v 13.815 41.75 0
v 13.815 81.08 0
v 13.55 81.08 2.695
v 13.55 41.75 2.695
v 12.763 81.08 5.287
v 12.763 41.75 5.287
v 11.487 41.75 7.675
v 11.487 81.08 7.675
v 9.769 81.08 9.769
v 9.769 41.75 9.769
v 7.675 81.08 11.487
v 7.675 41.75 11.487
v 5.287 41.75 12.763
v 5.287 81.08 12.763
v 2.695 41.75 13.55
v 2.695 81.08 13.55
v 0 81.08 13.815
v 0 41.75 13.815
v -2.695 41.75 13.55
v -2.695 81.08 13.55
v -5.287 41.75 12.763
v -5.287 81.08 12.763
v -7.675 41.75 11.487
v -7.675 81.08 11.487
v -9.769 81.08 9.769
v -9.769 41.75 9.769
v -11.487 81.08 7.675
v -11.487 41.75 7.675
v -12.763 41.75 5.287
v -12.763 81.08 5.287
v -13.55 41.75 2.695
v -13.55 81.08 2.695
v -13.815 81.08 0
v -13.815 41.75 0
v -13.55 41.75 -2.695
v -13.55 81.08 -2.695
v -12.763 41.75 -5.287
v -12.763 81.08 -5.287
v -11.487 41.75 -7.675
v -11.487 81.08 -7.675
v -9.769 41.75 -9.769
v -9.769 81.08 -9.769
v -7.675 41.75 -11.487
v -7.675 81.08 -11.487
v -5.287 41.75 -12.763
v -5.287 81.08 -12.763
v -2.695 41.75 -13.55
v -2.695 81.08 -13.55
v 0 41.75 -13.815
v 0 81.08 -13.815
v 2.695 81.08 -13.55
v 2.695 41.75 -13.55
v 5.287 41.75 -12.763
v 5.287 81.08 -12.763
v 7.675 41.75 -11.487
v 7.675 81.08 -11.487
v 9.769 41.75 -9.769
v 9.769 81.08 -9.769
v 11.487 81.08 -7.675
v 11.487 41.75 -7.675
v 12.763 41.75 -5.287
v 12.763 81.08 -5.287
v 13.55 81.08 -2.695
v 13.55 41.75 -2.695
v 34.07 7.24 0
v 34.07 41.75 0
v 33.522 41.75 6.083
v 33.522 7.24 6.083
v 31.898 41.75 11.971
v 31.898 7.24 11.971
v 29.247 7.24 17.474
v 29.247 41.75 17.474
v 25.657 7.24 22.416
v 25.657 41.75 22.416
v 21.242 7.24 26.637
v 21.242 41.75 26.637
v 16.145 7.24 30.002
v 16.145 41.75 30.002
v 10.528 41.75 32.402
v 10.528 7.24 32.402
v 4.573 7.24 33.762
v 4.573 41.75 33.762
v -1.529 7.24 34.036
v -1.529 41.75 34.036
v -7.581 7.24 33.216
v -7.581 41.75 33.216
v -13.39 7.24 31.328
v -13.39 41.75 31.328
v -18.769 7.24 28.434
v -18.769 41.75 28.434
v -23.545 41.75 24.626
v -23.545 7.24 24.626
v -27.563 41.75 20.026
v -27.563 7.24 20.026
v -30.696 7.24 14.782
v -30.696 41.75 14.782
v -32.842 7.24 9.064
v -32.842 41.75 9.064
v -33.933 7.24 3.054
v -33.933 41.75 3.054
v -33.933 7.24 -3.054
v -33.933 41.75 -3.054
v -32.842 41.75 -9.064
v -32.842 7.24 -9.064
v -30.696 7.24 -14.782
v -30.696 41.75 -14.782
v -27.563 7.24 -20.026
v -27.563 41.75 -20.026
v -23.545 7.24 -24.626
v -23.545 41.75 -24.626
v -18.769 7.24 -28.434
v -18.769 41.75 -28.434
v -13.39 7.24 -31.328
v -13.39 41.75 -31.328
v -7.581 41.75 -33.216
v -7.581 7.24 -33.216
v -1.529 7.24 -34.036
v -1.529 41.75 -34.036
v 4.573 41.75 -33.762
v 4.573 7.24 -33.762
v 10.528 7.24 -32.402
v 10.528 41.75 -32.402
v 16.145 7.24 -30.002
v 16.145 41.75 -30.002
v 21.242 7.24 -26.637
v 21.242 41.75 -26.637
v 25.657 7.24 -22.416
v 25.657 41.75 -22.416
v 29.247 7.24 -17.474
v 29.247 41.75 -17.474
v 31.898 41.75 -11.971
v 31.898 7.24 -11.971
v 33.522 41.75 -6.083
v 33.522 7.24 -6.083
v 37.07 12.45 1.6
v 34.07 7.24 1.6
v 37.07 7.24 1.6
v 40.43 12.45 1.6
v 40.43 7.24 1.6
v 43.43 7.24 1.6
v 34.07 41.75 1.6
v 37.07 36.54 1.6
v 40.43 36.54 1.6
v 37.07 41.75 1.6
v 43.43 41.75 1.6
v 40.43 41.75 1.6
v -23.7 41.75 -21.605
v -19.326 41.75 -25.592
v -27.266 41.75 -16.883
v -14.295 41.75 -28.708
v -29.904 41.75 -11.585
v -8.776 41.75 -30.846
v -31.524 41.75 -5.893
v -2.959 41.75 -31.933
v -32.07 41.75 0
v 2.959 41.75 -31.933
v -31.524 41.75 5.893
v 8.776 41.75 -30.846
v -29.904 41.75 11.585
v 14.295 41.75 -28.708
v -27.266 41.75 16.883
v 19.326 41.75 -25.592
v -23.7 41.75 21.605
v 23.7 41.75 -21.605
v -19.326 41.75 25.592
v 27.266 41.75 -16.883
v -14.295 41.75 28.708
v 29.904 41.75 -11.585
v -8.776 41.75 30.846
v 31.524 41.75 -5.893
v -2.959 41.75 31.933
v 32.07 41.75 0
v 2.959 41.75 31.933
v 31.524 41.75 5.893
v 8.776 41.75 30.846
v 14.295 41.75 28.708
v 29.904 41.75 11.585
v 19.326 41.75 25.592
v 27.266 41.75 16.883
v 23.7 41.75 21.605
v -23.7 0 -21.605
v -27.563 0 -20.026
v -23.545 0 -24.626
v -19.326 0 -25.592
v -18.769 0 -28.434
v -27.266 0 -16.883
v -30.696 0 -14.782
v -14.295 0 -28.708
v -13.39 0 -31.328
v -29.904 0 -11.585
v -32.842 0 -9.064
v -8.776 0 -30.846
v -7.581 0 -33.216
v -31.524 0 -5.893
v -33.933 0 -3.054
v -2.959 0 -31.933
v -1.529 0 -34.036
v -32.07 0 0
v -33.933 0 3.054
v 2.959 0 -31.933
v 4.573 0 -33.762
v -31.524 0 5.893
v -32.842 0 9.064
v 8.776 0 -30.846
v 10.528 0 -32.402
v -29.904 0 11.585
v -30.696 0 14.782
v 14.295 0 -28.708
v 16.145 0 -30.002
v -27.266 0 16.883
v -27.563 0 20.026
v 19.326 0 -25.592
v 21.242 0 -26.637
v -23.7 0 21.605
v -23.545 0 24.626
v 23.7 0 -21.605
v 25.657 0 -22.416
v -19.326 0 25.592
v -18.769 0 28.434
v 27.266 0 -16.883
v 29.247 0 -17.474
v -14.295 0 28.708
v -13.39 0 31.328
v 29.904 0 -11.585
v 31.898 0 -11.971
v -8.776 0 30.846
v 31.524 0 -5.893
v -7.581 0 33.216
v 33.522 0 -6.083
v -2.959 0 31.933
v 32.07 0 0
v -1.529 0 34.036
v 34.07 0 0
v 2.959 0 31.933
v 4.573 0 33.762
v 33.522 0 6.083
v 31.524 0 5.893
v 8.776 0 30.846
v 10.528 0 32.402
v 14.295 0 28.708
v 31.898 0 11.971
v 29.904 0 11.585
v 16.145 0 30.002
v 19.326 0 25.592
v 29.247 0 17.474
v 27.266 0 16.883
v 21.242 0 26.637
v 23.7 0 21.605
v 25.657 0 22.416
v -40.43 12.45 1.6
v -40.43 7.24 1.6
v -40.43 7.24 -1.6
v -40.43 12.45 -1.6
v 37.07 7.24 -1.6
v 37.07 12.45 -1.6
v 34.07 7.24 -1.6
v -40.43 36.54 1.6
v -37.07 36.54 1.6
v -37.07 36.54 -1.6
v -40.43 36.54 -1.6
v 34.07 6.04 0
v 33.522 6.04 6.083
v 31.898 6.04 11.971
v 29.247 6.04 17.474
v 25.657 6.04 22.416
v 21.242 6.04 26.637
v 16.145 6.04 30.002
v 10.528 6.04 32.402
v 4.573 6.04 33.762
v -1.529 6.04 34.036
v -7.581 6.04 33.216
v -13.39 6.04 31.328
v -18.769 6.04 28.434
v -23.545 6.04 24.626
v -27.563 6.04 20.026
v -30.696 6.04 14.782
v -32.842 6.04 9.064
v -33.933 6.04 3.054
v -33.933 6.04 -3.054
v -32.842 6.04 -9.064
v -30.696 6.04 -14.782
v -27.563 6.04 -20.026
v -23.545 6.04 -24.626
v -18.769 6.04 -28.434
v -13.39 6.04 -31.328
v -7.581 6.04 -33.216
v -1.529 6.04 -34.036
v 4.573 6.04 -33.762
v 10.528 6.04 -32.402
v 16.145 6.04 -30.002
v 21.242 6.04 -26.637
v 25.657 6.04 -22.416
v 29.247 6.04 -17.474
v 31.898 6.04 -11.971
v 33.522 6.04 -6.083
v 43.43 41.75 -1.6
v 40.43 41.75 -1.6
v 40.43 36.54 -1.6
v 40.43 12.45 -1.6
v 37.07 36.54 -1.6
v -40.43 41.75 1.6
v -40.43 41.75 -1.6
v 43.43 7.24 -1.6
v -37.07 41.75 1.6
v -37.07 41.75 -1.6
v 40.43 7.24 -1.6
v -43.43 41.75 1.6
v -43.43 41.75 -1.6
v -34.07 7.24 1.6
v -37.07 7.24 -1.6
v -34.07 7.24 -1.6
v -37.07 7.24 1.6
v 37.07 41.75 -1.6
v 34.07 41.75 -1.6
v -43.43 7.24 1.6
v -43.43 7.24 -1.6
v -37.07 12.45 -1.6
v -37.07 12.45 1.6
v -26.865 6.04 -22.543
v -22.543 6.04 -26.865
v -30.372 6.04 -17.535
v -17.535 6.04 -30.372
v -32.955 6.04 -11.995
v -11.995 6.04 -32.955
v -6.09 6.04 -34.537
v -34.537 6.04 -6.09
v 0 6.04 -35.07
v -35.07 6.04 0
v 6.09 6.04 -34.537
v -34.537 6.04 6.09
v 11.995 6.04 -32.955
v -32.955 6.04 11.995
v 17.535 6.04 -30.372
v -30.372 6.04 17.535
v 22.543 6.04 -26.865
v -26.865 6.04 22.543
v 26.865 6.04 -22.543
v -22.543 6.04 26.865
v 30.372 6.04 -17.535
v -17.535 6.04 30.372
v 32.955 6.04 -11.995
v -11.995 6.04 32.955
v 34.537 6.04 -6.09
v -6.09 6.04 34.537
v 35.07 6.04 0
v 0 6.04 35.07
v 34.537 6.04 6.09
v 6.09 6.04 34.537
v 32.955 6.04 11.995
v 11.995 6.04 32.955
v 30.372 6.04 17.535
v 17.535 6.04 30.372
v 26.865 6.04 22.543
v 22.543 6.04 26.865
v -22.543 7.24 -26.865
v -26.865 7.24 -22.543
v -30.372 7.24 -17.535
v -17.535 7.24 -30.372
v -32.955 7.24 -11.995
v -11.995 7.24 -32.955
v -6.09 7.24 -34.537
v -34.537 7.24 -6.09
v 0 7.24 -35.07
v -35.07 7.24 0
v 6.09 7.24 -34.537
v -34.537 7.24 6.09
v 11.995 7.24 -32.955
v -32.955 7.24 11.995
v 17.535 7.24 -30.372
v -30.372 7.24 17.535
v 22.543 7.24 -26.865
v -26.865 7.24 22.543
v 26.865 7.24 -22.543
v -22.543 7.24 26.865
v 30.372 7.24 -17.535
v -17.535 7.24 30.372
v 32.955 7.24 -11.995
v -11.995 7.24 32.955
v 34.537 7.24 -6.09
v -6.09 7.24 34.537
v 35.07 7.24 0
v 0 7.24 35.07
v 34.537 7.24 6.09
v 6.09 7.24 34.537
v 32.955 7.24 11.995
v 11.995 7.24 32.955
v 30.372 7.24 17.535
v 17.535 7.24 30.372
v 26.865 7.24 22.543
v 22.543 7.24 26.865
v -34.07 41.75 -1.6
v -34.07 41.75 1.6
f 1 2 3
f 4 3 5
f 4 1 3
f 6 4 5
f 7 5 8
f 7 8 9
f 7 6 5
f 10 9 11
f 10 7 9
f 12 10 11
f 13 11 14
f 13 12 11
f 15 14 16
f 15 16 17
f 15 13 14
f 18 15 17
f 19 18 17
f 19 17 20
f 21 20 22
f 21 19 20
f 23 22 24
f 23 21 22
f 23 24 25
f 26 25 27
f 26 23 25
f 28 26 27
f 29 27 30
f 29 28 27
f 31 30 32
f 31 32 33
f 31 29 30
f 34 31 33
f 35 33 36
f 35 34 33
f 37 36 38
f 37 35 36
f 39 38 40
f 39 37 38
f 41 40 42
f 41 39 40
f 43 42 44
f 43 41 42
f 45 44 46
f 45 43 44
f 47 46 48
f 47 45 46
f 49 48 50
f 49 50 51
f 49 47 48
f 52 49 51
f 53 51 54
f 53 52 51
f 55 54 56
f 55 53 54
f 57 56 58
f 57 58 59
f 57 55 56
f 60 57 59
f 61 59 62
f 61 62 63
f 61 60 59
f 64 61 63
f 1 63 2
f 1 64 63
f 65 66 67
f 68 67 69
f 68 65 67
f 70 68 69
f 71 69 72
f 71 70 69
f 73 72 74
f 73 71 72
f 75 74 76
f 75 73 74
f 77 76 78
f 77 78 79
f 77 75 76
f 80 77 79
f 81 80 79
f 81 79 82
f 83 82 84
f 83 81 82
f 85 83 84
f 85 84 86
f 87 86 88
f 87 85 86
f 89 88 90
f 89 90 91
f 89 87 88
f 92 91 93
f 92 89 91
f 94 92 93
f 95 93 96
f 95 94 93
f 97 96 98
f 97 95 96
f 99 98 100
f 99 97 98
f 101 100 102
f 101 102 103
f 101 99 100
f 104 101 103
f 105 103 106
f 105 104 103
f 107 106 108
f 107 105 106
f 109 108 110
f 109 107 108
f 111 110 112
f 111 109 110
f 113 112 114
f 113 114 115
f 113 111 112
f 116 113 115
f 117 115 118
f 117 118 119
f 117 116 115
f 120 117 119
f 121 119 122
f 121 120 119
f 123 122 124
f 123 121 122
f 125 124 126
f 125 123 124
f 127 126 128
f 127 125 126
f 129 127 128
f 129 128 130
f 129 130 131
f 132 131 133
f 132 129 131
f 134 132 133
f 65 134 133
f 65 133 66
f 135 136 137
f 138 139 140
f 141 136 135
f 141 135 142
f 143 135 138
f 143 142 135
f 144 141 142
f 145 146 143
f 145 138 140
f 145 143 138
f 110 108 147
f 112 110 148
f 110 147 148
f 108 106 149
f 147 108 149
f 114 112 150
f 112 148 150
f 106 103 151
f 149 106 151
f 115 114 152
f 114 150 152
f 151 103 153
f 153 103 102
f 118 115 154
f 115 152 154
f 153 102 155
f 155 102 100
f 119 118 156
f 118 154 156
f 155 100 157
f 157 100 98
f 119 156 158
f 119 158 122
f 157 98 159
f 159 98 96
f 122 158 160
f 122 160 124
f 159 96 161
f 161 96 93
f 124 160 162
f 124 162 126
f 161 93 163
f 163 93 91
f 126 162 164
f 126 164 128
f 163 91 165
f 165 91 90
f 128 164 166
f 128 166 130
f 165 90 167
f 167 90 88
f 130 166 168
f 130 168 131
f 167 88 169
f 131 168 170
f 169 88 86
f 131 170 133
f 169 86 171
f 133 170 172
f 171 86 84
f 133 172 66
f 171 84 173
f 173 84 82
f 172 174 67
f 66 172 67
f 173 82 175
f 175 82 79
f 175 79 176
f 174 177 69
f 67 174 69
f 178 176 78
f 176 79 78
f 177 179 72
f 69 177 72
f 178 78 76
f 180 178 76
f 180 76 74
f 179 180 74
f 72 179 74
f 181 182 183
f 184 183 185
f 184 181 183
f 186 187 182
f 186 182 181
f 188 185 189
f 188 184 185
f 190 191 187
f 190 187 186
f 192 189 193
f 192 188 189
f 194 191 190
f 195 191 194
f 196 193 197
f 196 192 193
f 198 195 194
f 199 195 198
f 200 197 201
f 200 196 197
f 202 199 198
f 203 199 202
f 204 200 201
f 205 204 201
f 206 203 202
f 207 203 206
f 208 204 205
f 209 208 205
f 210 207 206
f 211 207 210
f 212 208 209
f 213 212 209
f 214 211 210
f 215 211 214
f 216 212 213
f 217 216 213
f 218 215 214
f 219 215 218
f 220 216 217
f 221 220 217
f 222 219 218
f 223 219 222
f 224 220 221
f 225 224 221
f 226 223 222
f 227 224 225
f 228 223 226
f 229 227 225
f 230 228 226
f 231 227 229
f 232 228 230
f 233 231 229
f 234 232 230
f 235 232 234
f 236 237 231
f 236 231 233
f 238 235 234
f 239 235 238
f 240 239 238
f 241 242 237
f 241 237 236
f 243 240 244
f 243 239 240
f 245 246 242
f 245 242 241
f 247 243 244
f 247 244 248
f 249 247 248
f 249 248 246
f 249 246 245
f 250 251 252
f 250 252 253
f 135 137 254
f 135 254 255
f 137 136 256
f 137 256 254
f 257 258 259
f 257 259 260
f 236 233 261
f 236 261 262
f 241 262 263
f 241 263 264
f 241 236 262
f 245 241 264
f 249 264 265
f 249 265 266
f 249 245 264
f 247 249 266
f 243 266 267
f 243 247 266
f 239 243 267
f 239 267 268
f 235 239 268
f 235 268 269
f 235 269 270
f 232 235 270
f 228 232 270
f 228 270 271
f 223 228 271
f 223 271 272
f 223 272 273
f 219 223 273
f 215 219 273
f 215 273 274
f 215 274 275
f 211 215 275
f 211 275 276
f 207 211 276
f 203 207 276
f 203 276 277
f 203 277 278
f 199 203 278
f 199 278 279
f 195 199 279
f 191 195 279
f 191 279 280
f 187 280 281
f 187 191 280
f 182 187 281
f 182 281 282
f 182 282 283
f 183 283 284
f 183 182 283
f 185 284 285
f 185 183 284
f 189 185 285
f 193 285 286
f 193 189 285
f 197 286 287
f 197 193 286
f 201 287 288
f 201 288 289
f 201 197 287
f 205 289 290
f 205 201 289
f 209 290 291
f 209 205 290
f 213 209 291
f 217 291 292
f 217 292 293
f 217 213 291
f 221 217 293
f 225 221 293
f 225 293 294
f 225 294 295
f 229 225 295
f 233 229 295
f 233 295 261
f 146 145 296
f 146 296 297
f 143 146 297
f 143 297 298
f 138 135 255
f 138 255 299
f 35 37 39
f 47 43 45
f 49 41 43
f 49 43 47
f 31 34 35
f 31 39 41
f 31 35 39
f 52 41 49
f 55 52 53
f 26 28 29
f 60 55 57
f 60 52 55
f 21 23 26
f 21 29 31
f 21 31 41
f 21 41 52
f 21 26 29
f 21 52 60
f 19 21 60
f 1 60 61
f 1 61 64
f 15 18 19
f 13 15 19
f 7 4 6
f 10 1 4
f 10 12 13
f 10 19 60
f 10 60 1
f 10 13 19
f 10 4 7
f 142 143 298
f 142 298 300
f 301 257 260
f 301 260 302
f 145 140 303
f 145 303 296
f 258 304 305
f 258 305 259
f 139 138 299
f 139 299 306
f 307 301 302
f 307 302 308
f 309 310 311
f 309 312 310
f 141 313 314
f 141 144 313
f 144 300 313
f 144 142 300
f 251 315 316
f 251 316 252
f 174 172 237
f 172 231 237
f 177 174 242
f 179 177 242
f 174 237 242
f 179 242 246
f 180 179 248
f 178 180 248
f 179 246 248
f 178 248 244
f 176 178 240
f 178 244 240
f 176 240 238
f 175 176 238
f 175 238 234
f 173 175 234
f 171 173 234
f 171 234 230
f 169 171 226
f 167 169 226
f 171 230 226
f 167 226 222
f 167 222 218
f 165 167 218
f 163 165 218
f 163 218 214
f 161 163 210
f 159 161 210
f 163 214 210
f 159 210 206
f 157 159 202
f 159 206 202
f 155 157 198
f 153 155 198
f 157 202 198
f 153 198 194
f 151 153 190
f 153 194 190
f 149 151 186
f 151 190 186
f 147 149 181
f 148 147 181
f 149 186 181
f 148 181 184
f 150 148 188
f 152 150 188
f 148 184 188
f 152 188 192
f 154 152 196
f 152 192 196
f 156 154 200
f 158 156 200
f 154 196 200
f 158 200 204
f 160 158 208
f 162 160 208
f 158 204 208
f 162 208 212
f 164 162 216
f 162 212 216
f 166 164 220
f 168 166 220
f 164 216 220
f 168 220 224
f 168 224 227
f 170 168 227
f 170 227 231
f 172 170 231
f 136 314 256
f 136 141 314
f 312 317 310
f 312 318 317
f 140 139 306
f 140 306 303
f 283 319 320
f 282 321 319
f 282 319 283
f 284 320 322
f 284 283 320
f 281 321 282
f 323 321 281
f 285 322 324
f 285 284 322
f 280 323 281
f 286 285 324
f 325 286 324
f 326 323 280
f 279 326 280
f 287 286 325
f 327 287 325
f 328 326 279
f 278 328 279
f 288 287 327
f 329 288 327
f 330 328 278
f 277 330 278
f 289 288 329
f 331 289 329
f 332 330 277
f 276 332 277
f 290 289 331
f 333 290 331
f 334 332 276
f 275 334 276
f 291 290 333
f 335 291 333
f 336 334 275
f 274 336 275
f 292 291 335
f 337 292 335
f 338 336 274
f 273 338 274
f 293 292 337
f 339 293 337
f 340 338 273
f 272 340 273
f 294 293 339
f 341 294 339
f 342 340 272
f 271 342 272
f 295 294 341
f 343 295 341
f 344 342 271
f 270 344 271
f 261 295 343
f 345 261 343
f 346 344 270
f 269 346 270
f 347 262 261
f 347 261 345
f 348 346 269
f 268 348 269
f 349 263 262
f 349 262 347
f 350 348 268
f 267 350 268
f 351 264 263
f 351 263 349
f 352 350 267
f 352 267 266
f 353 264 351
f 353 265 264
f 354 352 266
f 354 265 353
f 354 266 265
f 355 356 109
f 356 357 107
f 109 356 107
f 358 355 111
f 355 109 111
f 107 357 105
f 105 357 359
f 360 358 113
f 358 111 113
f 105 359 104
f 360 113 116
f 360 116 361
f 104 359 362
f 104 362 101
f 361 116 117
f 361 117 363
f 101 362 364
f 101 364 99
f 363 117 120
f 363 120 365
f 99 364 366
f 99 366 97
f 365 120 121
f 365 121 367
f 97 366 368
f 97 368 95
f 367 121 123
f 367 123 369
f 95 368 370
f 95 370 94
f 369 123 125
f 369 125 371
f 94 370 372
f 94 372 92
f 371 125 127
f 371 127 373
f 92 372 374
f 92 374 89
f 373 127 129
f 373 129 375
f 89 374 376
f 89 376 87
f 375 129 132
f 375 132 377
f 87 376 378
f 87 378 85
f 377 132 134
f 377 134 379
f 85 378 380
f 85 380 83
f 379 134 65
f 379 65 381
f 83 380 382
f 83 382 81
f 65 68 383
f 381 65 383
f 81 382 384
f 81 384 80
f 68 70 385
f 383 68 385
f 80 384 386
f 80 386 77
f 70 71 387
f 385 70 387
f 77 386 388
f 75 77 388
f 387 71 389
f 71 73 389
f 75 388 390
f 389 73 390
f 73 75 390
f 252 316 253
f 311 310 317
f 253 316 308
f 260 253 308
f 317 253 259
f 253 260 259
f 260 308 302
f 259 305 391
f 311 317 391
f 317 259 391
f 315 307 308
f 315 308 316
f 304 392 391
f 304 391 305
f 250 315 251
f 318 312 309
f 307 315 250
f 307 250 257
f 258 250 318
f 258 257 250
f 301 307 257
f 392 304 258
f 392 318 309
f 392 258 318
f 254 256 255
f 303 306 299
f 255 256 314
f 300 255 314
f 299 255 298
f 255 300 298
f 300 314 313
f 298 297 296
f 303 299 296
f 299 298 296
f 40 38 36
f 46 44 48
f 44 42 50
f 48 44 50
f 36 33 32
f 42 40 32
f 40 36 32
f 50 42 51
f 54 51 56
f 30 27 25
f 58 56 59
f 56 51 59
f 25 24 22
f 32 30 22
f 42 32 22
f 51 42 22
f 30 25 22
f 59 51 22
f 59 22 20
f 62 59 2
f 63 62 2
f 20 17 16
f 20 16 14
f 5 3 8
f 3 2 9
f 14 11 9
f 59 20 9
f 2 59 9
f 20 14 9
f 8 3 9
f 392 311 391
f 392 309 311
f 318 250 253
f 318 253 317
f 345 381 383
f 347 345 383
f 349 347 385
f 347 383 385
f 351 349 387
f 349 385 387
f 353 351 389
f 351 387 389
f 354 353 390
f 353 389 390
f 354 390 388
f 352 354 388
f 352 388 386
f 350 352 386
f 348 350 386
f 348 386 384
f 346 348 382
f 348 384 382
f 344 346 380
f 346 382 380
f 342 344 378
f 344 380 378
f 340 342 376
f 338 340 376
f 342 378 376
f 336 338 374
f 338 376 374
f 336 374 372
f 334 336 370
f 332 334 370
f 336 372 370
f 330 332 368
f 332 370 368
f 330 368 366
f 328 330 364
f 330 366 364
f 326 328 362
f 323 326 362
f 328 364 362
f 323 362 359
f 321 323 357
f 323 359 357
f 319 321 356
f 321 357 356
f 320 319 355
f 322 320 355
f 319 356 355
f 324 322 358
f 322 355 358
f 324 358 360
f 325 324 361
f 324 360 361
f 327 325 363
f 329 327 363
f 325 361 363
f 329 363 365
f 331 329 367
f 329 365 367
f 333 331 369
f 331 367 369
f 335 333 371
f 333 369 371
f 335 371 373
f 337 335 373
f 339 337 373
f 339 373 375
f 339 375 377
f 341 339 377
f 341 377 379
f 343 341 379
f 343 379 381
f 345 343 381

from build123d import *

# Parameters (mm, degrees)
F0_R      = 34.07
F0_R_2    = 32.07
F3_DEPTH  = 7.24
F2_R      = 35.07
F2_R_2    = 32.07
F4_DEPTH  = 1.2
F6_R      = 34.07
F6_R_2    = 32.07
F7_DEPTH  = 34.51
F9_R      = 13.815
F10_DEPTH = 39.33
F12_DEPTH = 1.6


with BuildPart() as f3:
    # F0 (on Front) → F3 (new body, through all)
    with BuildSketch(Plane.XZ):
        Circle(F0_R)
        Circle(F0_R_2, mode=Mode.SUBTRACT)
    extrude(amount=-F3_DEPTH)

    # F2 (on offset) → F4 (join)
    with BuildSketch(Plane.XZ.offset(-7.24)):
        Circle(F2_R)
        Circle(F2_R_2, mode=Mode.SUBTRACT)
    extrude(amount=F4_DEPTH)

    # F6 (on offset) → F7 (join)
    with BuildSketch(Plane.XZ.offset(-7.24)):
        Circle(F6_R)
        Circle(F6_R_2, mode=Mode.SUBTRACT)
    extrude(amount=-F7_DEPTH)


with BuildPart() as f10:
    # F9 (on offset) → F10 (new body)
    with BuildSketch(Plane.XZ.offset(-41.75)):
        Circle(F9_R)
    extrude(amount=-F10_DEPTH)


with BuildPart() as f12:
    # F11 (on Top) → F12 (new body, symmetric)
    with BuildSketch(Plane.XY):
        Polygon((-34.07, 7.24), (-34.07, 41.75), (-37.07, 41.75), (-37.07, 36.54), (-40.43, 36.54), (-40.43, 41.75), (-43.43, 41.75), (-43.43, 7.24), (-40.43, 7.24), (-40.43, 12.45), (-37.07, 12.45), (-37.07, 7.24), align=None)
    extrude(amount=F12_DEPTH, both=True)


with BuildPart() as f12b:
    # F11 (on Top) → F12, piece 2 (new body, symmetric)
    with BuildSketch(Plane.XY):
        Polygon((34.07, 41.75), (34.07, 7.24), (35.07, 7.24), (37.07, 7.24), (37.07, 12.45), (40.43, 12.45), (40.43, 7.24), (43.43, 7.24), (43.43, 41.75), (40.43, 41.75), (40.43, 36.54), (37.07, 36.54), (37.07, 41.75), align=None)
    extrude(amount=F12_DEPTH, both=True)


solid = Compound([f3.part, f10.part, f12.part, f12b.part])
